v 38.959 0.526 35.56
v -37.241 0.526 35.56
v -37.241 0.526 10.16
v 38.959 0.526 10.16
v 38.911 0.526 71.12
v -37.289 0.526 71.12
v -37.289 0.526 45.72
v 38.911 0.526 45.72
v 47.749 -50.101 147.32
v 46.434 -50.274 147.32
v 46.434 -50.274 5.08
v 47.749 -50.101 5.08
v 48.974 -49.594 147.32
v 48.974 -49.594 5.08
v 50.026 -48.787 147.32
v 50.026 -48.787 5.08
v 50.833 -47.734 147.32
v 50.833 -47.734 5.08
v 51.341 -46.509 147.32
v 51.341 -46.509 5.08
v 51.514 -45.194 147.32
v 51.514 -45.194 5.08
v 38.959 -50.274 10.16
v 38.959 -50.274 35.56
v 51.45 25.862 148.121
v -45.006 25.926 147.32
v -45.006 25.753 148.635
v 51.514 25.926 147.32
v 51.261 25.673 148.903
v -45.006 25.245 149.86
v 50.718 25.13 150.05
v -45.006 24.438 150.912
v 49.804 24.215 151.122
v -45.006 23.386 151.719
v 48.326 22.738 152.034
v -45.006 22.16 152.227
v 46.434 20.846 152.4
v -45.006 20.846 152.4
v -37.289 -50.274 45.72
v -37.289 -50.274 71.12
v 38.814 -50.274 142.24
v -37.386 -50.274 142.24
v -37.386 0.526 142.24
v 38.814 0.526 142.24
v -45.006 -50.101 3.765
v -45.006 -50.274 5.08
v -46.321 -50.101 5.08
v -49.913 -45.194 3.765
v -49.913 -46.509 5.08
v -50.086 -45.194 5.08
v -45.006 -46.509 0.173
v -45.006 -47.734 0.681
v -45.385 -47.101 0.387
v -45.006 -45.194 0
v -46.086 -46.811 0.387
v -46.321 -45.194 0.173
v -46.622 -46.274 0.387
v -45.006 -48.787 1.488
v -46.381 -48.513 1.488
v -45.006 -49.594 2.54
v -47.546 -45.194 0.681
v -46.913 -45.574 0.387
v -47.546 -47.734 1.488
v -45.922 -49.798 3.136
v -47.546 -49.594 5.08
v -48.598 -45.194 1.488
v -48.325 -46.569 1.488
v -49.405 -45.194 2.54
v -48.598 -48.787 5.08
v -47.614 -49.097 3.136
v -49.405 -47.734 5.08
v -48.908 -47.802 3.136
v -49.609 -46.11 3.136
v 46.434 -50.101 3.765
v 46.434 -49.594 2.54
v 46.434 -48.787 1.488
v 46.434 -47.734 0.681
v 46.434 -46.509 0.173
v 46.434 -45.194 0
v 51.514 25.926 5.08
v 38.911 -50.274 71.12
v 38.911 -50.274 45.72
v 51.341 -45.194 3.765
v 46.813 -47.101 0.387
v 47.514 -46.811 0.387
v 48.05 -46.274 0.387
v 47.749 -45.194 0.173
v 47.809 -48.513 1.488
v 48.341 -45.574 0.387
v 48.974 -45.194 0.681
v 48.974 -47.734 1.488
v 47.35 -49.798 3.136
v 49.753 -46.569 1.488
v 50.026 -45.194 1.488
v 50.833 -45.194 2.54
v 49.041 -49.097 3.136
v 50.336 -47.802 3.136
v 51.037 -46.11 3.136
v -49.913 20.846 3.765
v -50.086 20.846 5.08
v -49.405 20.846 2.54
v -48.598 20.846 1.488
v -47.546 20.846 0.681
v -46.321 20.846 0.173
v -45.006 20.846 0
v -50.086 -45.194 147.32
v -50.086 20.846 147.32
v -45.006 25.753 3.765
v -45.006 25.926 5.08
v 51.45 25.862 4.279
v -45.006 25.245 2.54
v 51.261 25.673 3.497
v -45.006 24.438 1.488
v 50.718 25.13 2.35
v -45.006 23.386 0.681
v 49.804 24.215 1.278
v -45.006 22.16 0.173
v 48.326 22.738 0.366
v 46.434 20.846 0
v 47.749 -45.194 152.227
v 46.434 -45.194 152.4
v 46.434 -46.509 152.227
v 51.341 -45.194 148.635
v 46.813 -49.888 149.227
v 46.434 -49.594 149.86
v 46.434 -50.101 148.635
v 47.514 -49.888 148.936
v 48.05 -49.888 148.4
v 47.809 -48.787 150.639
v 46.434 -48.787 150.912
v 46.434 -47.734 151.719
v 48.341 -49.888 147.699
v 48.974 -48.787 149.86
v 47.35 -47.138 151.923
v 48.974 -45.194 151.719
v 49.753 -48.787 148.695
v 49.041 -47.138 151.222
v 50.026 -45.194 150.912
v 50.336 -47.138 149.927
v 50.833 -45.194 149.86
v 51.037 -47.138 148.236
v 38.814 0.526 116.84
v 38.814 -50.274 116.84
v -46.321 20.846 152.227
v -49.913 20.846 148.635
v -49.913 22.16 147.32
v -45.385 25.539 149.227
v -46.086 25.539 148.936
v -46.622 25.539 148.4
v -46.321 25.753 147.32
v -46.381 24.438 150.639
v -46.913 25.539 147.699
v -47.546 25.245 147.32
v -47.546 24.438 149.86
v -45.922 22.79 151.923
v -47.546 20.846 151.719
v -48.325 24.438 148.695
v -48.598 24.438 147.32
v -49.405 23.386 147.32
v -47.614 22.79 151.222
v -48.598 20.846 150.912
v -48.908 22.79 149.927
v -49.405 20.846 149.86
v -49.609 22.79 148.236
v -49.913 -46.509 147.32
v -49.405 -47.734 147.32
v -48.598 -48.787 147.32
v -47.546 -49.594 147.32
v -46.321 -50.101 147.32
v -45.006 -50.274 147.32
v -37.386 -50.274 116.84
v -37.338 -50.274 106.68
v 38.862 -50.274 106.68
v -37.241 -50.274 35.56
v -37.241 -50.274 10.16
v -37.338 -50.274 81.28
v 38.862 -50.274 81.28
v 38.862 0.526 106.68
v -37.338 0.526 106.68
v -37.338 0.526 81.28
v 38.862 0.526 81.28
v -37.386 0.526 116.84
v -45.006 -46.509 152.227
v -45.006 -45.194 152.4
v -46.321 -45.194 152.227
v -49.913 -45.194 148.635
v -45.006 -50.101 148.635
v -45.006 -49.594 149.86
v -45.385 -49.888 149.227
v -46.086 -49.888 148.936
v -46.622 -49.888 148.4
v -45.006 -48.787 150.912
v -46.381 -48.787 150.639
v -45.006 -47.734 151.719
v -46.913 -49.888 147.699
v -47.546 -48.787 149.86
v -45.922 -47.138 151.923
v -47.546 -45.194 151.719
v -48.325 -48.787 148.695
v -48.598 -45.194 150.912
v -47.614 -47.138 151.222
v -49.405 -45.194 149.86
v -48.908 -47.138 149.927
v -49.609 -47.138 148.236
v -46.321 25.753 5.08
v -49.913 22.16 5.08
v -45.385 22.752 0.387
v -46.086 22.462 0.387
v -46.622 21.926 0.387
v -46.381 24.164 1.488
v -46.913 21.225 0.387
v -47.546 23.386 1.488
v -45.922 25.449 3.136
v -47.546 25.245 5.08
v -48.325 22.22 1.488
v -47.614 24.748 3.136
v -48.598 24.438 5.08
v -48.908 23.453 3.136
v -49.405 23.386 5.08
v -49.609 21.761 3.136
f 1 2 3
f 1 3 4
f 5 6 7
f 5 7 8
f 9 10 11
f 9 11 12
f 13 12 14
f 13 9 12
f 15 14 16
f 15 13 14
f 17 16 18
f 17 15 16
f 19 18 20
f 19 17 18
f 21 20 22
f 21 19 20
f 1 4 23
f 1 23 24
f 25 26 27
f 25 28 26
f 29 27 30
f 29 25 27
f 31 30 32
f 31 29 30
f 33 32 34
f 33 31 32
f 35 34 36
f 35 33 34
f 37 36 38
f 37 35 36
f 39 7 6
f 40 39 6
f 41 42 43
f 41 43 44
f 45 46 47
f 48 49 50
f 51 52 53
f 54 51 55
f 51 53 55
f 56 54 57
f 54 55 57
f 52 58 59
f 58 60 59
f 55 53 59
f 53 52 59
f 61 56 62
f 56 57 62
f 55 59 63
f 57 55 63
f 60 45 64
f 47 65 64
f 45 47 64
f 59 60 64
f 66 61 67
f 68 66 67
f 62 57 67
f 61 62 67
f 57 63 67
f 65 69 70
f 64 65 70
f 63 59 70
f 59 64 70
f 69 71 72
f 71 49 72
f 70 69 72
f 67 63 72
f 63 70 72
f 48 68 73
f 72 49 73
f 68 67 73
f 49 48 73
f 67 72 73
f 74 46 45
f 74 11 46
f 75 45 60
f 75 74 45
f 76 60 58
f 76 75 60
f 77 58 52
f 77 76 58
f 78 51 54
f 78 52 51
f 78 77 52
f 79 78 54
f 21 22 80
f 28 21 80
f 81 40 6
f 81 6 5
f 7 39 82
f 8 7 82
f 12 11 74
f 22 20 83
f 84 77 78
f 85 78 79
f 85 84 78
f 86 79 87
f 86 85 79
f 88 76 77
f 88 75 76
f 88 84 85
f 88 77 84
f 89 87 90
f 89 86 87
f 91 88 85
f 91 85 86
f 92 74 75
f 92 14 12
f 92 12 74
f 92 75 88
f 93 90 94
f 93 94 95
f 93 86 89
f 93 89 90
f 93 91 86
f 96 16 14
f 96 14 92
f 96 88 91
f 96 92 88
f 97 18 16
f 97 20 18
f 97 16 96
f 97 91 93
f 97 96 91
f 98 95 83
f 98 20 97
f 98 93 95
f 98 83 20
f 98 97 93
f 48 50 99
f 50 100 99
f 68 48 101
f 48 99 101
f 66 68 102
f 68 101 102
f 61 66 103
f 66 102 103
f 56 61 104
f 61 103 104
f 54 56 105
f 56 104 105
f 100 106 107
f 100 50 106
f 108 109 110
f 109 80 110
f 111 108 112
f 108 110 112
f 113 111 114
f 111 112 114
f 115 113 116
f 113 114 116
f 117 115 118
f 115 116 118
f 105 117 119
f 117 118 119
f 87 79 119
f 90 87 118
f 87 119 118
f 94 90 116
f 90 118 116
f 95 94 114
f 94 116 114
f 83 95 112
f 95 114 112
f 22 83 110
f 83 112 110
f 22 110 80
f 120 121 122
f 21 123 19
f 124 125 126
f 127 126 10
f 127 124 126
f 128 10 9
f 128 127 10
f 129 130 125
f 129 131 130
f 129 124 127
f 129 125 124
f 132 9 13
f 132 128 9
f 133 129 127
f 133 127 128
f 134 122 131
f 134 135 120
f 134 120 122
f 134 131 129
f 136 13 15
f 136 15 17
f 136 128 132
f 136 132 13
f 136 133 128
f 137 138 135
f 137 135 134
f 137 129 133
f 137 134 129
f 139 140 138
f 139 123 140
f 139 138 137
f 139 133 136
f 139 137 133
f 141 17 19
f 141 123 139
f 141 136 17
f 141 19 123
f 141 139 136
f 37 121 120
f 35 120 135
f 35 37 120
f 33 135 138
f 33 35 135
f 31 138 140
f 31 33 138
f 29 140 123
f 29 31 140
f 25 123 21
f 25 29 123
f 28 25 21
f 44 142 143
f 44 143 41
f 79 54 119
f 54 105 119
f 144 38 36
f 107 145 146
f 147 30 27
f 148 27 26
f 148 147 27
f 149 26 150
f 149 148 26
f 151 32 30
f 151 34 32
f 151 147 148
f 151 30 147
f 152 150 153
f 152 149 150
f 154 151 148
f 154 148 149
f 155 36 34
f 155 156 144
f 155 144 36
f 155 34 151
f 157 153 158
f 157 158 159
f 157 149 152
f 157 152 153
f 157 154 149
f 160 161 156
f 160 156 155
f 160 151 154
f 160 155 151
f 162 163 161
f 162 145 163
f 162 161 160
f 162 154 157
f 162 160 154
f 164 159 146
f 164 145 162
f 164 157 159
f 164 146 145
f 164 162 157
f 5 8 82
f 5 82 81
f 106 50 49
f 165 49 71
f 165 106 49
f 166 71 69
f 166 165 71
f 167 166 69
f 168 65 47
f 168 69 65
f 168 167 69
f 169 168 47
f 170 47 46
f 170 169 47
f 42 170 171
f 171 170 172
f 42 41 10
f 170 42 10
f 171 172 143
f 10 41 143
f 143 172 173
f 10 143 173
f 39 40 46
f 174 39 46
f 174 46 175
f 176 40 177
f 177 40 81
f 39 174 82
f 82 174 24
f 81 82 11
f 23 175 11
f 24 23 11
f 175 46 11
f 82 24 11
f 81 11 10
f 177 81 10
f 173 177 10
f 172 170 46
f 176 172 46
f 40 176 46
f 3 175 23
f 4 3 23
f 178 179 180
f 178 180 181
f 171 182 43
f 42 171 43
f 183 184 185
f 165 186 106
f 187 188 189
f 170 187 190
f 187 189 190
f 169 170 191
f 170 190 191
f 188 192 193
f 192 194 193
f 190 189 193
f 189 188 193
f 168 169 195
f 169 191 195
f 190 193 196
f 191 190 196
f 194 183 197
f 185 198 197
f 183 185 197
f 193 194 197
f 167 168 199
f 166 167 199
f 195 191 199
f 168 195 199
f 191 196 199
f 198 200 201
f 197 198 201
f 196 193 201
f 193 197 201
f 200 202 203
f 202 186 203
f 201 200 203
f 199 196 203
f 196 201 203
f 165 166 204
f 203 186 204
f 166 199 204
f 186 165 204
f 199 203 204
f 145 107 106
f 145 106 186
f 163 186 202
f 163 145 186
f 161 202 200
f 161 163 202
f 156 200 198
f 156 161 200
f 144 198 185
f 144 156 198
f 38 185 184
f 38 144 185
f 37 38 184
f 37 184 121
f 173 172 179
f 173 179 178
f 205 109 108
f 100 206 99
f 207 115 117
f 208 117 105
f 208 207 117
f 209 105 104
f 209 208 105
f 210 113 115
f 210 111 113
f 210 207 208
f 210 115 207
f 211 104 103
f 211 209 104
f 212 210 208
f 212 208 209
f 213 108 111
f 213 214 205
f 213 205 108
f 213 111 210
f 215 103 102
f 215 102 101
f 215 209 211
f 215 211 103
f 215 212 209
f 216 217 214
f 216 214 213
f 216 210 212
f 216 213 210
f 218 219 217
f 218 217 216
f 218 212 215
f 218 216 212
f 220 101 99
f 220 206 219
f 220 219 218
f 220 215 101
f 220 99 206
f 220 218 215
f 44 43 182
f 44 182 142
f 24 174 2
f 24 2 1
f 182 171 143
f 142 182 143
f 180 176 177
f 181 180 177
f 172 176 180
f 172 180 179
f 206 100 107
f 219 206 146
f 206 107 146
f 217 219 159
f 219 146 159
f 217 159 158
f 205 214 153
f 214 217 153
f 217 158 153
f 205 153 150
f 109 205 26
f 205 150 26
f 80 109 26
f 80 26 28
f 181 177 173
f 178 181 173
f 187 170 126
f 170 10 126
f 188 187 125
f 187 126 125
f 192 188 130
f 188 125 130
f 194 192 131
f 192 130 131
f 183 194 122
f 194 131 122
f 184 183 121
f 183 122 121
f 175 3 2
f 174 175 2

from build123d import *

# Parameters (mm, degrees)
F0_W     = 101.6
F0_H     = 76.2
F1_DEPTH = 152.4
F2_W     = 76.2
F2_H     = 25.4
F3_DEPTH = 50.8
F4_R     = 5.08


with BuildPart() as f1:
    # F0 (on Top) → F1 (new body)
    with BuildSketch(Plane.XY):
        with Locations((0.713926, -12.174402)):
            Rectangle(F0_W, F0_H)
    extrude(amount=F1_DEPTH)

    # F2 (on face) → F3 (cut)
    with BuildSketch(Plane.XZ.offset(50.274402)):
        with Locations((0.713926, 129.54)):
            Rectangle(F2_W, F2_H)
        with Locations((0.762346, 93.980033)):
            Rectangle(F2_W, F2_H)
        with Locations((0.810766, 58.420066)):
            Rectangle(F2_W, F2_H)
        with Locations((0.859186, 22.860099)):
            Rectangle(F2_W, F2_H)
    extrude(amount=-F3_DEPTH, mode=Mode.SUBTRACT)

    # F4
    f4_edges = [f1.edges().sort_by_distance(p)[0] for p in [
        (-50.086074, -12.174402, 152.4),
        (51.513926, -12.174402, 152.4),
        (0.713926, 25.925598, 152.4),
        (0.713926, -50.274402, 152.4),
        (51.513926, -50.274402, 76.2),
        (-50.086074, -50.274402, 76.2),
        (-50.086074, 25.925598, 76.2),
        (0.713926, -50.274402, 0),
        (51.513926, -12.174402, 0),
        (0.713926, 25.925598, 0),
        (-50.086074, -12.174402, 0),
    ]]
    fillet(f4_edges, radius=F4_R)


solid = f1.part
